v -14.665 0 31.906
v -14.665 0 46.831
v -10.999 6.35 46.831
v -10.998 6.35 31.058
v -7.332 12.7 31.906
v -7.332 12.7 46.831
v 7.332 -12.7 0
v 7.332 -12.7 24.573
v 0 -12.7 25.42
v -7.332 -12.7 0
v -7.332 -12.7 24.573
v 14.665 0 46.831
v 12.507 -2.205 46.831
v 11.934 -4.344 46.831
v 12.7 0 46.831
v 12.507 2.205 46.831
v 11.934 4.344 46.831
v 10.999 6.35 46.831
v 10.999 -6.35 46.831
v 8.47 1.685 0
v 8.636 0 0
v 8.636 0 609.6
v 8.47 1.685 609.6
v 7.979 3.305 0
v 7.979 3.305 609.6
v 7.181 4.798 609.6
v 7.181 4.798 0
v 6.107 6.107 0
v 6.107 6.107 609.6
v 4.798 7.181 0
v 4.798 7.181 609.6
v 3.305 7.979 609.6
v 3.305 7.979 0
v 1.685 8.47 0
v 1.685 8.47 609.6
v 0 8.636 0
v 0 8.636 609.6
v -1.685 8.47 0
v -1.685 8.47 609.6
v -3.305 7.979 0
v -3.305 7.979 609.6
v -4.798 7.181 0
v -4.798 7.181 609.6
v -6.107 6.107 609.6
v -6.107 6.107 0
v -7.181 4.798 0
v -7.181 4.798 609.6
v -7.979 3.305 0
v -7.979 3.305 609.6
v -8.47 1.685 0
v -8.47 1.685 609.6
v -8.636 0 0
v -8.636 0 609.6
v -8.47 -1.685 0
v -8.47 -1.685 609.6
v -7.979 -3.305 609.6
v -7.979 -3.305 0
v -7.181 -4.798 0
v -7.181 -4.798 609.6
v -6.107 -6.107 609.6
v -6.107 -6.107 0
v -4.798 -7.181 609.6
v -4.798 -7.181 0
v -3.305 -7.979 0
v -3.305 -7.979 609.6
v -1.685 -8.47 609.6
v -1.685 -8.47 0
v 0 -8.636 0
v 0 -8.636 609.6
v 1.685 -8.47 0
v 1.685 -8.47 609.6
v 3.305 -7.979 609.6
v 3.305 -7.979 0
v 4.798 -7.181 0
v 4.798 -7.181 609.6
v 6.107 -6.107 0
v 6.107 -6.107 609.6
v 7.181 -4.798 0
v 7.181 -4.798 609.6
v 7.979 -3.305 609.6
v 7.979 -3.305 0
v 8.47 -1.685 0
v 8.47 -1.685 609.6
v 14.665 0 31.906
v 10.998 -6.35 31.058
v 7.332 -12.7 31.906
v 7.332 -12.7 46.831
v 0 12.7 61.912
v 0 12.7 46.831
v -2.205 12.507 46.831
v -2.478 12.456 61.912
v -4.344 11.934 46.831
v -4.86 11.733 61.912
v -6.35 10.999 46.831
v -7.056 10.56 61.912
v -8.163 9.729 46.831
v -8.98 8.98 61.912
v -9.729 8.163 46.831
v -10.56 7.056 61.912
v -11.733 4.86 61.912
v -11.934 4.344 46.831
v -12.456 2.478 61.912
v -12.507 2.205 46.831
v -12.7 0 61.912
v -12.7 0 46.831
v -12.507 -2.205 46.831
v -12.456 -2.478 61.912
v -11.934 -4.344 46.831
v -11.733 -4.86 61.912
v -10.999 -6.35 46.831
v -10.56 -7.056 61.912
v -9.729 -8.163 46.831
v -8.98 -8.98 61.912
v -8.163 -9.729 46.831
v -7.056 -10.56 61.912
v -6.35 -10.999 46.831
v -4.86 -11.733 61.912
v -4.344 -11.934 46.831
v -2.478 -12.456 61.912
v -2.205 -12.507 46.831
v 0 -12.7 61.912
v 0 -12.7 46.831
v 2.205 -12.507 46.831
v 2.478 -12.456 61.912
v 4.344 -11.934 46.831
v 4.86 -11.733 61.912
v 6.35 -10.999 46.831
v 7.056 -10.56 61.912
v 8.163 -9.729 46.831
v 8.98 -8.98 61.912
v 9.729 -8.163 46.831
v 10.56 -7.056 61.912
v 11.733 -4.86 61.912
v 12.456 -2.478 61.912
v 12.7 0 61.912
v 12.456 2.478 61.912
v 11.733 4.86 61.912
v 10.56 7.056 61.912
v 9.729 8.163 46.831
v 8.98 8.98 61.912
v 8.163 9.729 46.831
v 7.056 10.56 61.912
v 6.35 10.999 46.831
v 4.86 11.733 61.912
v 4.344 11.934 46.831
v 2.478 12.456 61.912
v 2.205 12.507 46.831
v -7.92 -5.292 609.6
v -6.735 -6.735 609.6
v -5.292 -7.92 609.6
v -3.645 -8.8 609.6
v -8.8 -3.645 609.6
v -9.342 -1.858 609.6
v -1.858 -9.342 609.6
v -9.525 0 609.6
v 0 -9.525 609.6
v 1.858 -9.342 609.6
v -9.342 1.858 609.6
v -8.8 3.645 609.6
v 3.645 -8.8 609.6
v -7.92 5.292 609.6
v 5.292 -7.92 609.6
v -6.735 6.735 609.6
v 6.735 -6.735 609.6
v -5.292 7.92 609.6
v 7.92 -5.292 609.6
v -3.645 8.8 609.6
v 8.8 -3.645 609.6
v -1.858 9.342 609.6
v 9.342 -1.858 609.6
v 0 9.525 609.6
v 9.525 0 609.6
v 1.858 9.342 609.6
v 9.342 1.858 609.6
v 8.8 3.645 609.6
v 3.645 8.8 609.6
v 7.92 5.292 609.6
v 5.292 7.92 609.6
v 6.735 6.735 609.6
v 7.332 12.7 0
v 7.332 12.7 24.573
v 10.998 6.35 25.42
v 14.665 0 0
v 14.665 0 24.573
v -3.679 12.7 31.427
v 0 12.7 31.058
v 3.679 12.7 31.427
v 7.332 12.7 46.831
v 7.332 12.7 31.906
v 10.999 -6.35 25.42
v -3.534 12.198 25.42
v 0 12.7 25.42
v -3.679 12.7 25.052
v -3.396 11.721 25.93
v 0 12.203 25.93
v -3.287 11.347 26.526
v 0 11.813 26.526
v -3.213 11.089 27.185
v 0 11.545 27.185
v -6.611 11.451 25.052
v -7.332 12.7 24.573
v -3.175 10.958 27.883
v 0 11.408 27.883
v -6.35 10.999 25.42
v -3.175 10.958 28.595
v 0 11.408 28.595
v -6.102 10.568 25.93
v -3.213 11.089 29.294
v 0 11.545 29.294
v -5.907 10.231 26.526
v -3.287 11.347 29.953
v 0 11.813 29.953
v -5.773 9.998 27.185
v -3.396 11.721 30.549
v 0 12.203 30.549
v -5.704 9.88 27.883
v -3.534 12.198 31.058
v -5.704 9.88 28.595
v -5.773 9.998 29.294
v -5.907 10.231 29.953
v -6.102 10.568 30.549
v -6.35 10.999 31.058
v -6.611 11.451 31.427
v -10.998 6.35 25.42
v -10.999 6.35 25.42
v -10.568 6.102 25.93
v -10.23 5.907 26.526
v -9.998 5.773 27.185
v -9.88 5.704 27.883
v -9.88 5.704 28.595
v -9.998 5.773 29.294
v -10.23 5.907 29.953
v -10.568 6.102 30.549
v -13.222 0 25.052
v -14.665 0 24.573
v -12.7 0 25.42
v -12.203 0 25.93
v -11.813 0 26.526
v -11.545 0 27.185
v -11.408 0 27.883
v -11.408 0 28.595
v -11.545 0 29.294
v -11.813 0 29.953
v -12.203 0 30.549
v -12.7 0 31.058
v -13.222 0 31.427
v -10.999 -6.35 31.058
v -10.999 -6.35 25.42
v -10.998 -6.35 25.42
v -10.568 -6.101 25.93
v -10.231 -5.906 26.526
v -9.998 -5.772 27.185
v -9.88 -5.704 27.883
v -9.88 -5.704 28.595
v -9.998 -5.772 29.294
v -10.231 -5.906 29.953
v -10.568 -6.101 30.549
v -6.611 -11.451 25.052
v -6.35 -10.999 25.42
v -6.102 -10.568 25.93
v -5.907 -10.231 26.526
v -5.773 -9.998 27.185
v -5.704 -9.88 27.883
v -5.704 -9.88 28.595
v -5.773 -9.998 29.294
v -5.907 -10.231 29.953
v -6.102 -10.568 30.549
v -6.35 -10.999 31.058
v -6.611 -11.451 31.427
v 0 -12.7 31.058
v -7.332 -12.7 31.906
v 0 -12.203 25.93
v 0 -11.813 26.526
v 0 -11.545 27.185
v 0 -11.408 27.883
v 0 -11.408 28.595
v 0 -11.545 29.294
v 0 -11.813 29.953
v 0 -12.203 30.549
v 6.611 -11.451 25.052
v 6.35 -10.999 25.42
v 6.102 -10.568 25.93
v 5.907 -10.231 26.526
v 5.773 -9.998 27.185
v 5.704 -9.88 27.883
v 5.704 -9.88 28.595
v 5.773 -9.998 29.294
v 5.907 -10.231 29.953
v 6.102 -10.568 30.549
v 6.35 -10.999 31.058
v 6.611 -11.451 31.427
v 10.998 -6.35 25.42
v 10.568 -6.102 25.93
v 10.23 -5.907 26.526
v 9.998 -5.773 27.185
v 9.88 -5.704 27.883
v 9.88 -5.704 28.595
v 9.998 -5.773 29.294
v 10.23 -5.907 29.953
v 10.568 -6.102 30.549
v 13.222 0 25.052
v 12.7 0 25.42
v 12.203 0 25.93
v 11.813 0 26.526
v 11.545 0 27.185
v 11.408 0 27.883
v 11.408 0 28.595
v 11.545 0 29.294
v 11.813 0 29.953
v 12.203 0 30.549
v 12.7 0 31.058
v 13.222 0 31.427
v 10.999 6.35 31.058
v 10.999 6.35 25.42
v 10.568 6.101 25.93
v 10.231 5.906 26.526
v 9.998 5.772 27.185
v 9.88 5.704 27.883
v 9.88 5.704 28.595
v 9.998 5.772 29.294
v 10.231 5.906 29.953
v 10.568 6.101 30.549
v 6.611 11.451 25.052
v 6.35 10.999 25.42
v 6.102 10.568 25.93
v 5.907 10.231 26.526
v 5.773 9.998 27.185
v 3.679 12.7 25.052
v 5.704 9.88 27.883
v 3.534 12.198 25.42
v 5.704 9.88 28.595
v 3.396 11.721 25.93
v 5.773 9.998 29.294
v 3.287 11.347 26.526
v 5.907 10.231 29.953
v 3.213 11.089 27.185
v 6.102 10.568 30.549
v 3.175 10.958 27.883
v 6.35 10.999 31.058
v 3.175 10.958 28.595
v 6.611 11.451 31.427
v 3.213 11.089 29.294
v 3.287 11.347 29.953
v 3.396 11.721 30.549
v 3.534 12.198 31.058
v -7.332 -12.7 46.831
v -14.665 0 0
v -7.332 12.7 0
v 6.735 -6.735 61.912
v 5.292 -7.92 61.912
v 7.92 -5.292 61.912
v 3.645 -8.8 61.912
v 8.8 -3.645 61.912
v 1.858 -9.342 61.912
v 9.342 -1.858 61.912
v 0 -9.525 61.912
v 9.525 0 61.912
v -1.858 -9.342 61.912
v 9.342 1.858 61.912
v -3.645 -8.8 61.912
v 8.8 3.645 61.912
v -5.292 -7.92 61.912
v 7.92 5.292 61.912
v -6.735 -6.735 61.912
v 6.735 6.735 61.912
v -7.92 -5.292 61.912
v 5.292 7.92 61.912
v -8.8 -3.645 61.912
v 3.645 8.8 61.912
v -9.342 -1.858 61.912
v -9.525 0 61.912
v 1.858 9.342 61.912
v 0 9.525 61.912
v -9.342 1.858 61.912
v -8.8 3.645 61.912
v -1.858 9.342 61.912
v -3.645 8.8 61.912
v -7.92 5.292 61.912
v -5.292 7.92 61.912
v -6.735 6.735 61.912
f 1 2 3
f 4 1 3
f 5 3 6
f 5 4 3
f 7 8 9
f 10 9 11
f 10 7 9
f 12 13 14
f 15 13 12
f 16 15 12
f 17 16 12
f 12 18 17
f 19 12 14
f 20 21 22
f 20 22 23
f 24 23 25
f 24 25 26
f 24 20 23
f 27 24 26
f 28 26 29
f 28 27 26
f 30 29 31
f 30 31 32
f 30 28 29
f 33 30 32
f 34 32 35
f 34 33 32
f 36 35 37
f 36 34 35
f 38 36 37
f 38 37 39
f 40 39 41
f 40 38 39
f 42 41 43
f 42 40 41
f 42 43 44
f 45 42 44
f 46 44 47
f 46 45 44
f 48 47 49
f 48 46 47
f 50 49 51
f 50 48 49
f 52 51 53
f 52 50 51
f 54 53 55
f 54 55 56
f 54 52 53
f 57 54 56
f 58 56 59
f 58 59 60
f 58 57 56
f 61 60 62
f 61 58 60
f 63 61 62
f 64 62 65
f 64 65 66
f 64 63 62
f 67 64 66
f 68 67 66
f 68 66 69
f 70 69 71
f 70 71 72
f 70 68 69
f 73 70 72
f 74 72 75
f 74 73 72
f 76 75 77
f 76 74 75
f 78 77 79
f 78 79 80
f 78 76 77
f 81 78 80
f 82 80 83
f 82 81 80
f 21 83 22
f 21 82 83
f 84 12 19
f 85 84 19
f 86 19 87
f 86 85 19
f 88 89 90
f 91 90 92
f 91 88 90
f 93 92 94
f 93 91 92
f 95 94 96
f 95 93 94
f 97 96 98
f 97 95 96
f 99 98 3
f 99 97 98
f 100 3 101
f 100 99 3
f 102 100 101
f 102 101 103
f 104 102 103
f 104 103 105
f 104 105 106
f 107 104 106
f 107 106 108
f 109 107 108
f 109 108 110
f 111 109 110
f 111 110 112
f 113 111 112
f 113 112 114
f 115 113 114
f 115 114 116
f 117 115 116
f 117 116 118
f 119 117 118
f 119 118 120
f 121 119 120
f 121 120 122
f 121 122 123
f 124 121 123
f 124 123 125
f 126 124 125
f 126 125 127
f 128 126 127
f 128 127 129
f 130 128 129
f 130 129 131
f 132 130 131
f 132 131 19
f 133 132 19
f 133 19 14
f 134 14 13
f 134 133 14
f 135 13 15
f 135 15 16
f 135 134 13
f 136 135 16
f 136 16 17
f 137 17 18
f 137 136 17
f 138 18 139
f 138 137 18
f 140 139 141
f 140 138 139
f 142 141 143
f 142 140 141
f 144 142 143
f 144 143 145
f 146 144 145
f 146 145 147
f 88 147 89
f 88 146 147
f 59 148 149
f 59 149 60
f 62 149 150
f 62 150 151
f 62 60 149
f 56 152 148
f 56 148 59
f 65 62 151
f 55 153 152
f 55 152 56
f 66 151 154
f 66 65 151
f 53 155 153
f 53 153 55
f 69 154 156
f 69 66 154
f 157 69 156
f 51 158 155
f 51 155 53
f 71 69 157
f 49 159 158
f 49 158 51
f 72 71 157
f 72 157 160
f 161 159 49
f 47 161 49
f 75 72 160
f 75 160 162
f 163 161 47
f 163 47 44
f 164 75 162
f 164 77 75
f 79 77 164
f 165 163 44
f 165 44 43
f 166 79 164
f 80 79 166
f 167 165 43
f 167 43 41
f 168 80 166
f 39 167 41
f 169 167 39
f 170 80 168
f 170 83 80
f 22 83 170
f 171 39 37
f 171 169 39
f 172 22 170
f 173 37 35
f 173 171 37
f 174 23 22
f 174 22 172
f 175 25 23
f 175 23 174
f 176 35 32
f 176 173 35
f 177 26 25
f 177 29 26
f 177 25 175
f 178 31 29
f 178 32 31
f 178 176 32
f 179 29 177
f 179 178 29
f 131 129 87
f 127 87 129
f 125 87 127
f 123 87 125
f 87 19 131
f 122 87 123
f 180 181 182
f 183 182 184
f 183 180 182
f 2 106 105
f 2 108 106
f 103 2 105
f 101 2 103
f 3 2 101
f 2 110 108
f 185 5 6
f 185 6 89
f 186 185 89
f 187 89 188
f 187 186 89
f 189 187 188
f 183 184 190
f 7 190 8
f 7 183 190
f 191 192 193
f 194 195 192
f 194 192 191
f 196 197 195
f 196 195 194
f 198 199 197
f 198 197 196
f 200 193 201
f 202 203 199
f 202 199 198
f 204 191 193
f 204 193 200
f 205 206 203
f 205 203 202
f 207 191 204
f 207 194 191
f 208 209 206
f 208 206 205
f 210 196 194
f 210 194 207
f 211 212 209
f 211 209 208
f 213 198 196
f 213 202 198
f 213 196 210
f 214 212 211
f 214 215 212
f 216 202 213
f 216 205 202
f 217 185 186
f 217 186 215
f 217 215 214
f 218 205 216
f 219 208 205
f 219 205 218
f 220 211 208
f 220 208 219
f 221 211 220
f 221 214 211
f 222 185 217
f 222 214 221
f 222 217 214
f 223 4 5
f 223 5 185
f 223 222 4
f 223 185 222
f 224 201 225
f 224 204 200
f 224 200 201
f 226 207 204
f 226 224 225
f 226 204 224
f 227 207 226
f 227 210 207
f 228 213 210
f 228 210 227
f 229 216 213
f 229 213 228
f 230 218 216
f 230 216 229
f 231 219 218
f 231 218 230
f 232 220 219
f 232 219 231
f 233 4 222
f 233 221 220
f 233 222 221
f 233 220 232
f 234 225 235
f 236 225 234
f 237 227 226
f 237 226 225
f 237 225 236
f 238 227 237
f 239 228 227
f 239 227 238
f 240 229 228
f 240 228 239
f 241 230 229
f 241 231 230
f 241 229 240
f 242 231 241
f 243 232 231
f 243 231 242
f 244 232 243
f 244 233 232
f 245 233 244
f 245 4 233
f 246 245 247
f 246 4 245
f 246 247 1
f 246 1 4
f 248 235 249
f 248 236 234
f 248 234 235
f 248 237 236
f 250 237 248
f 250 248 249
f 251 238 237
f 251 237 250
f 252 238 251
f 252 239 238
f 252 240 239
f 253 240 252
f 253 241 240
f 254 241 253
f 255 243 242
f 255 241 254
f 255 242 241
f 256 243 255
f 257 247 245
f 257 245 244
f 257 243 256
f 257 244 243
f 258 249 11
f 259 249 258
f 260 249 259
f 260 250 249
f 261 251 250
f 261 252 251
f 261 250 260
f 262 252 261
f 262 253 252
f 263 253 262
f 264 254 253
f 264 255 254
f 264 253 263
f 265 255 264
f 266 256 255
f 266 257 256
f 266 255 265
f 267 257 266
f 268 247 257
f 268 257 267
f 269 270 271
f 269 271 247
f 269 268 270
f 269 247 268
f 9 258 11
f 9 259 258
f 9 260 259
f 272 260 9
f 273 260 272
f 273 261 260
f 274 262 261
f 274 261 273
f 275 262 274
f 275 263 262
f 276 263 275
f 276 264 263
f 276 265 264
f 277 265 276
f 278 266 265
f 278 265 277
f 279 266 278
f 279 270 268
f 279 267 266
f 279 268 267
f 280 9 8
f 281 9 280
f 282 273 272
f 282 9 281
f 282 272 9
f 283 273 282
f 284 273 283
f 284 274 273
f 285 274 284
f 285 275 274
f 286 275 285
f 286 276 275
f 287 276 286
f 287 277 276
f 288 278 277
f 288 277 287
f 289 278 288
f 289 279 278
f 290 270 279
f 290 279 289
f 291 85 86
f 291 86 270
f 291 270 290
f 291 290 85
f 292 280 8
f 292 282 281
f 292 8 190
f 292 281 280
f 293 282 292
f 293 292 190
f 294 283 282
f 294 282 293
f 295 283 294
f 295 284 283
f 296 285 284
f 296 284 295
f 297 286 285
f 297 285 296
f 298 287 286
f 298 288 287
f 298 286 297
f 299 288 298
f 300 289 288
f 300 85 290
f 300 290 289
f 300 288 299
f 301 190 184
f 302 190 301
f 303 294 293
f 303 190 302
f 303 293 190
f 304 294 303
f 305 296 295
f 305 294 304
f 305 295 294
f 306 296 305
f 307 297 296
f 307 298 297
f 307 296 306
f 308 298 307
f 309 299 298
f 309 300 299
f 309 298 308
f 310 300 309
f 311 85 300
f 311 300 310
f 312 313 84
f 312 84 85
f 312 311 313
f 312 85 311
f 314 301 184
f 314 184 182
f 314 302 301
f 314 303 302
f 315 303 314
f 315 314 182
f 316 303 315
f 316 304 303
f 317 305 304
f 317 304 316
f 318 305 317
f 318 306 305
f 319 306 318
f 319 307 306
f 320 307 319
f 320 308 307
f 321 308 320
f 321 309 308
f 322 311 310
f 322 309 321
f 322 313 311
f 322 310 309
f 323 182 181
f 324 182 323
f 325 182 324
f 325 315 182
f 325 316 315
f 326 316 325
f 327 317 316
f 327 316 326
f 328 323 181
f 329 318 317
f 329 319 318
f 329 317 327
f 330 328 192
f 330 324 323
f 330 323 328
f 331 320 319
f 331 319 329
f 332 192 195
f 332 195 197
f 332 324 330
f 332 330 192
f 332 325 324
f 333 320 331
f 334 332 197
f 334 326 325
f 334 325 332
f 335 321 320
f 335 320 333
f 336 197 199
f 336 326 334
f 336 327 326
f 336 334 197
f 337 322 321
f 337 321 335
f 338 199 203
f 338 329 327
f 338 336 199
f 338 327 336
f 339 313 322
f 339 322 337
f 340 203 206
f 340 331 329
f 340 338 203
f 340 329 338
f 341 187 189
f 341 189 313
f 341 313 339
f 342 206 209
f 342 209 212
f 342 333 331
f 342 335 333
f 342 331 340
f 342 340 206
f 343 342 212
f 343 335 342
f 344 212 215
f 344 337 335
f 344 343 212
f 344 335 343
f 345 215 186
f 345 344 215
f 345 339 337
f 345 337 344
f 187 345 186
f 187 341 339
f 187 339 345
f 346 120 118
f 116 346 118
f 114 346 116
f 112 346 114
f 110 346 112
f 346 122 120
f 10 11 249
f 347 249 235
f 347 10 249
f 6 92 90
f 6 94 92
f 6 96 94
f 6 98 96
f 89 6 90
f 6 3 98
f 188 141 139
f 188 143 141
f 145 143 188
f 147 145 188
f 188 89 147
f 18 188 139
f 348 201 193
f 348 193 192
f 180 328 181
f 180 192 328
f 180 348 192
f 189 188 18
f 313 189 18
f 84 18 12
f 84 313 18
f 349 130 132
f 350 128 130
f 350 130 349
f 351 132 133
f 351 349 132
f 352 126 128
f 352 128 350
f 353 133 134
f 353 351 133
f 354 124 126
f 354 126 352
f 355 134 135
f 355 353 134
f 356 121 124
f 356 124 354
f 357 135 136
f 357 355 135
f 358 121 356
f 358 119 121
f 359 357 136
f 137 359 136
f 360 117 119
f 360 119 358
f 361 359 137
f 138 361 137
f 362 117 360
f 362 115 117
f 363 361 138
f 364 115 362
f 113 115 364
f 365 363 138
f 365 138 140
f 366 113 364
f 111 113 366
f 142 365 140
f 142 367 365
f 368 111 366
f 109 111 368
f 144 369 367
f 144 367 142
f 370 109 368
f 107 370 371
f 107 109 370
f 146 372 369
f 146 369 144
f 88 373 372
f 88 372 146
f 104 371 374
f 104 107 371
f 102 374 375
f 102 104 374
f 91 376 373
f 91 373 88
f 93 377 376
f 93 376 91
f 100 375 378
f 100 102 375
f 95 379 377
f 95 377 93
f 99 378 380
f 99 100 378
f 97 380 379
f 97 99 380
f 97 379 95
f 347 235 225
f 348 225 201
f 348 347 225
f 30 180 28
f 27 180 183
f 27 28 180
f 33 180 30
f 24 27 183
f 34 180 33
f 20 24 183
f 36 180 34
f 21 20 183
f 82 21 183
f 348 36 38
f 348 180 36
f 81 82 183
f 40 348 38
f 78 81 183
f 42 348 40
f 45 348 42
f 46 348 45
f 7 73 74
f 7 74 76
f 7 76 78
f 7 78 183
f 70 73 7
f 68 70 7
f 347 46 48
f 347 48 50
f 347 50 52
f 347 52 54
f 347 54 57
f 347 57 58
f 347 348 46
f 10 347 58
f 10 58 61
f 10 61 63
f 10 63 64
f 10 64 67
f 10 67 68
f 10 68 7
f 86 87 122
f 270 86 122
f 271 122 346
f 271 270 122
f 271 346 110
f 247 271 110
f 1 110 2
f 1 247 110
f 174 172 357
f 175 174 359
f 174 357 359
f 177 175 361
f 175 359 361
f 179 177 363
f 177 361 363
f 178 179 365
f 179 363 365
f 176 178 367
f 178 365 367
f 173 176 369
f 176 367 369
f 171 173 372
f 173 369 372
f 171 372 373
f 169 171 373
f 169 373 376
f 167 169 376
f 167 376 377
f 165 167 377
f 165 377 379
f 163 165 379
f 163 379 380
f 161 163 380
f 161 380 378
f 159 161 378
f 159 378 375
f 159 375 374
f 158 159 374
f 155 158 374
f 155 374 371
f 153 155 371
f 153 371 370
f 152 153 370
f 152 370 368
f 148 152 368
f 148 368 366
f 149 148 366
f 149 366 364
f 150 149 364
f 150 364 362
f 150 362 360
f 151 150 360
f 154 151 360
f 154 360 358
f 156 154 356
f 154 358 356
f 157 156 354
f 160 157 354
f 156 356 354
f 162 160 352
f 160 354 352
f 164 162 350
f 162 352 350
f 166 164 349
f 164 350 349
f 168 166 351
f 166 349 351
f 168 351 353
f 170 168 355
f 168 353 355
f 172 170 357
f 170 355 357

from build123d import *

# Parameters (mm, degrees)
SKETCH1_R           = 9.525
SKETCH1_R_2         = 8.636
BOSS_EXTRUDE1_DEPTH = 609.6
SKETCH3_R           = 20.246819027
CUT_EXTRUDE1_DEPTH  = 101.6


with BuildPart() as part:
    # Sketch1 → Boss-Extrude1 (new body)
    with BuildSketch(Plane.XY):
        Circle(SKETCH1_R)
        Circle(SKETCH1_R_2, mode=Mode.SUBTRACT)
    extrude(amount=BOSS_EXTRUDE1_DEPTH)

    # Sketch2 → Revolve1 (revolve)
    with BuildSketch(Plane(origin=(0, 0, 0), x_dir=(0, 0, -1), z_dir=(1, 0, 0))):
        with BuildLine():
            Line((-61.9125, 9.525), (0, 9.525))
            Line((0, 9.525), (0, 17.78))
            Line((0, 17.78), (-25.722714052, 17.78))
            ThreePointArc((-25.722714052, 17.78), (-24.855324241, 16.552662429), (-24.549271858, 15.08125))
            ThreePointArc((-24.549271858, 15.08125), (-29.710775793, 11.697210877), (-30.756012676, 17.78))
            Line((-30.756012676, 17.78), (-46.83125, 17.78))
            Line((-46.83125, 17.78), (-46.83125, 12.7))
            Line((-46.83125, 12.7), (-61.9125, 12.7))
            Line((-61.9125, 12.7), (-61.9125, 9.525))
        make_face()
    revolve(axis=Axis((0, 0, 0), (0, 0, 1)))

    # Sketch3 → Cut-Extrude1 (cut)
    with BuildSketch(Plane(origin=(0, 0, 0), x_dir=(-1, 0, 0), z_dir=(0, 0, -1))):
        Circle(SKETCH3_R)
        Polygon((14.664696837, 0), (7.332348419, 12.7), (-7.332348419, 12.7), (-14.664696837, 0), (-7.332348419, -12.7), (7.332348419, -12.7), align=None, mode=Mode.SUBTRACT)
    extrude(amount=-CUT_EXTRUDE1_DEPTH, mode=Mode.SUBTRACT)


solid = part.part
